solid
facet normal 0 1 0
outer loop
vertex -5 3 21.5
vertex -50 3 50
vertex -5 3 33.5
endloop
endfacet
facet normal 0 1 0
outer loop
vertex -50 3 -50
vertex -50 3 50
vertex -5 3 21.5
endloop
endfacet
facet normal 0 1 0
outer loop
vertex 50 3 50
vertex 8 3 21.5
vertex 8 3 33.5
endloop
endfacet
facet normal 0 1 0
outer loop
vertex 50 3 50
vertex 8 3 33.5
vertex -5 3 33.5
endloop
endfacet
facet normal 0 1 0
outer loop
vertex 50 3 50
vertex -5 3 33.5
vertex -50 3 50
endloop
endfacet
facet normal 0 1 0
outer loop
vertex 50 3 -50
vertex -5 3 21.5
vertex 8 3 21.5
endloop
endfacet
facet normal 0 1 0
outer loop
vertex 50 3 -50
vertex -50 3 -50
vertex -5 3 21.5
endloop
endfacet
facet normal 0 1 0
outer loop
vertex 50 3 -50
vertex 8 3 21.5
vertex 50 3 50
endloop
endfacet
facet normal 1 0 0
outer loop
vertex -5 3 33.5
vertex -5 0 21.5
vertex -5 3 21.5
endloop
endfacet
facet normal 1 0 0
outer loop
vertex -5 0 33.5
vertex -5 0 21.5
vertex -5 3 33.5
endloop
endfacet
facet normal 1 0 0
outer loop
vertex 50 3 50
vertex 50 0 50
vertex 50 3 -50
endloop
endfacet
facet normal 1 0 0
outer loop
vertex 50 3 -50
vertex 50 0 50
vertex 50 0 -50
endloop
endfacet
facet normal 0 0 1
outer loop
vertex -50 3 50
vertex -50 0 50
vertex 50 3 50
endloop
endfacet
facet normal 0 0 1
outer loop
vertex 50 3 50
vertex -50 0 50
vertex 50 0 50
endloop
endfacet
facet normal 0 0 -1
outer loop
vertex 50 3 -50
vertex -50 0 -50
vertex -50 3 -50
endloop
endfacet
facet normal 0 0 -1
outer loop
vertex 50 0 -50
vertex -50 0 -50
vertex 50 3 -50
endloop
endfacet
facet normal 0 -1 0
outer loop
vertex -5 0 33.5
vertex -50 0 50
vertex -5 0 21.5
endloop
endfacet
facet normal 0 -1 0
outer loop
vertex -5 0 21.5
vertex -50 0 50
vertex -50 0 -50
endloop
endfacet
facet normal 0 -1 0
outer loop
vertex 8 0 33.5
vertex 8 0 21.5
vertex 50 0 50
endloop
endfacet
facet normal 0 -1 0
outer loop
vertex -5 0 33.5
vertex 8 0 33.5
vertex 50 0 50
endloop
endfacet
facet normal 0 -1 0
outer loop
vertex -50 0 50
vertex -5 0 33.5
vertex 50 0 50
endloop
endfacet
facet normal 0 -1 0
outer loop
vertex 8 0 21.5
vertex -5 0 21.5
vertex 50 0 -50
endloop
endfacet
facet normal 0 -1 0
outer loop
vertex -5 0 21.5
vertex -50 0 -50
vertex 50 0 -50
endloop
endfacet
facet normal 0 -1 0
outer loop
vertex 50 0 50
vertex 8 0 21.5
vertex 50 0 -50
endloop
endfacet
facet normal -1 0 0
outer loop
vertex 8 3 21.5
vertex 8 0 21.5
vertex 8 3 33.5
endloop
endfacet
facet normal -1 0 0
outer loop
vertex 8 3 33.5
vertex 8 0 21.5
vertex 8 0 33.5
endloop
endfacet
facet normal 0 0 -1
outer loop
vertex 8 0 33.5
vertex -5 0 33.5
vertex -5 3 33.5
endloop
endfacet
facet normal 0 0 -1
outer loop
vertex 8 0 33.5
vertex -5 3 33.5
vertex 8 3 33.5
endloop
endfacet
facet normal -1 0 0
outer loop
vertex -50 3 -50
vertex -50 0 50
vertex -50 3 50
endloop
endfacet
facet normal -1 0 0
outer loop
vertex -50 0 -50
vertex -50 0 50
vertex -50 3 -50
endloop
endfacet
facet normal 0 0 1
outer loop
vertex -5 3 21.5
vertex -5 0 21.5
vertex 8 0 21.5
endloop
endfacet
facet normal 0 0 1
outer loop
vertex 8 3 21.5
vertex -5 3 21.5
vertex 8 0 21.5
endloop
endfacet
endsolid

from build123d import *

# Parameters (mm, degrees)
SKETCH1_W           = 100
SKETCH1_H           = 100
BOSS_EXTRUDE1_DEPTH = 3
SKETCH3_W           = 13
SKETCH3_H           = 12
CUT_EXTRUDE3_DEPTH  = 3


with BuildPart() as part:
    # Sketch1 → Boss-Extrude1 (new body)
    with BuildSketch(Plane(origin=(0, 0, 0), x_dir=(1, 0, 0), z_dir=(0, 1, 0))):
        Rectangle(SKETCH1_W, SKETCH1_H)
    extrude(amount=BOSS_EXTRUDE1_DEPTH)

    # Sketch3 → Cut-Extrude3 (cut)
    with BuildSketch(Plane.XZ):
        with Locations((1.5, 27.5)):
            Rectangle(SKETCH3_W, SKETCH3_H)
    extrude(amount=-CUT_EXTRUDE3_DEPTH, mode=Mode.SUBTRACT)


solid = part.part
